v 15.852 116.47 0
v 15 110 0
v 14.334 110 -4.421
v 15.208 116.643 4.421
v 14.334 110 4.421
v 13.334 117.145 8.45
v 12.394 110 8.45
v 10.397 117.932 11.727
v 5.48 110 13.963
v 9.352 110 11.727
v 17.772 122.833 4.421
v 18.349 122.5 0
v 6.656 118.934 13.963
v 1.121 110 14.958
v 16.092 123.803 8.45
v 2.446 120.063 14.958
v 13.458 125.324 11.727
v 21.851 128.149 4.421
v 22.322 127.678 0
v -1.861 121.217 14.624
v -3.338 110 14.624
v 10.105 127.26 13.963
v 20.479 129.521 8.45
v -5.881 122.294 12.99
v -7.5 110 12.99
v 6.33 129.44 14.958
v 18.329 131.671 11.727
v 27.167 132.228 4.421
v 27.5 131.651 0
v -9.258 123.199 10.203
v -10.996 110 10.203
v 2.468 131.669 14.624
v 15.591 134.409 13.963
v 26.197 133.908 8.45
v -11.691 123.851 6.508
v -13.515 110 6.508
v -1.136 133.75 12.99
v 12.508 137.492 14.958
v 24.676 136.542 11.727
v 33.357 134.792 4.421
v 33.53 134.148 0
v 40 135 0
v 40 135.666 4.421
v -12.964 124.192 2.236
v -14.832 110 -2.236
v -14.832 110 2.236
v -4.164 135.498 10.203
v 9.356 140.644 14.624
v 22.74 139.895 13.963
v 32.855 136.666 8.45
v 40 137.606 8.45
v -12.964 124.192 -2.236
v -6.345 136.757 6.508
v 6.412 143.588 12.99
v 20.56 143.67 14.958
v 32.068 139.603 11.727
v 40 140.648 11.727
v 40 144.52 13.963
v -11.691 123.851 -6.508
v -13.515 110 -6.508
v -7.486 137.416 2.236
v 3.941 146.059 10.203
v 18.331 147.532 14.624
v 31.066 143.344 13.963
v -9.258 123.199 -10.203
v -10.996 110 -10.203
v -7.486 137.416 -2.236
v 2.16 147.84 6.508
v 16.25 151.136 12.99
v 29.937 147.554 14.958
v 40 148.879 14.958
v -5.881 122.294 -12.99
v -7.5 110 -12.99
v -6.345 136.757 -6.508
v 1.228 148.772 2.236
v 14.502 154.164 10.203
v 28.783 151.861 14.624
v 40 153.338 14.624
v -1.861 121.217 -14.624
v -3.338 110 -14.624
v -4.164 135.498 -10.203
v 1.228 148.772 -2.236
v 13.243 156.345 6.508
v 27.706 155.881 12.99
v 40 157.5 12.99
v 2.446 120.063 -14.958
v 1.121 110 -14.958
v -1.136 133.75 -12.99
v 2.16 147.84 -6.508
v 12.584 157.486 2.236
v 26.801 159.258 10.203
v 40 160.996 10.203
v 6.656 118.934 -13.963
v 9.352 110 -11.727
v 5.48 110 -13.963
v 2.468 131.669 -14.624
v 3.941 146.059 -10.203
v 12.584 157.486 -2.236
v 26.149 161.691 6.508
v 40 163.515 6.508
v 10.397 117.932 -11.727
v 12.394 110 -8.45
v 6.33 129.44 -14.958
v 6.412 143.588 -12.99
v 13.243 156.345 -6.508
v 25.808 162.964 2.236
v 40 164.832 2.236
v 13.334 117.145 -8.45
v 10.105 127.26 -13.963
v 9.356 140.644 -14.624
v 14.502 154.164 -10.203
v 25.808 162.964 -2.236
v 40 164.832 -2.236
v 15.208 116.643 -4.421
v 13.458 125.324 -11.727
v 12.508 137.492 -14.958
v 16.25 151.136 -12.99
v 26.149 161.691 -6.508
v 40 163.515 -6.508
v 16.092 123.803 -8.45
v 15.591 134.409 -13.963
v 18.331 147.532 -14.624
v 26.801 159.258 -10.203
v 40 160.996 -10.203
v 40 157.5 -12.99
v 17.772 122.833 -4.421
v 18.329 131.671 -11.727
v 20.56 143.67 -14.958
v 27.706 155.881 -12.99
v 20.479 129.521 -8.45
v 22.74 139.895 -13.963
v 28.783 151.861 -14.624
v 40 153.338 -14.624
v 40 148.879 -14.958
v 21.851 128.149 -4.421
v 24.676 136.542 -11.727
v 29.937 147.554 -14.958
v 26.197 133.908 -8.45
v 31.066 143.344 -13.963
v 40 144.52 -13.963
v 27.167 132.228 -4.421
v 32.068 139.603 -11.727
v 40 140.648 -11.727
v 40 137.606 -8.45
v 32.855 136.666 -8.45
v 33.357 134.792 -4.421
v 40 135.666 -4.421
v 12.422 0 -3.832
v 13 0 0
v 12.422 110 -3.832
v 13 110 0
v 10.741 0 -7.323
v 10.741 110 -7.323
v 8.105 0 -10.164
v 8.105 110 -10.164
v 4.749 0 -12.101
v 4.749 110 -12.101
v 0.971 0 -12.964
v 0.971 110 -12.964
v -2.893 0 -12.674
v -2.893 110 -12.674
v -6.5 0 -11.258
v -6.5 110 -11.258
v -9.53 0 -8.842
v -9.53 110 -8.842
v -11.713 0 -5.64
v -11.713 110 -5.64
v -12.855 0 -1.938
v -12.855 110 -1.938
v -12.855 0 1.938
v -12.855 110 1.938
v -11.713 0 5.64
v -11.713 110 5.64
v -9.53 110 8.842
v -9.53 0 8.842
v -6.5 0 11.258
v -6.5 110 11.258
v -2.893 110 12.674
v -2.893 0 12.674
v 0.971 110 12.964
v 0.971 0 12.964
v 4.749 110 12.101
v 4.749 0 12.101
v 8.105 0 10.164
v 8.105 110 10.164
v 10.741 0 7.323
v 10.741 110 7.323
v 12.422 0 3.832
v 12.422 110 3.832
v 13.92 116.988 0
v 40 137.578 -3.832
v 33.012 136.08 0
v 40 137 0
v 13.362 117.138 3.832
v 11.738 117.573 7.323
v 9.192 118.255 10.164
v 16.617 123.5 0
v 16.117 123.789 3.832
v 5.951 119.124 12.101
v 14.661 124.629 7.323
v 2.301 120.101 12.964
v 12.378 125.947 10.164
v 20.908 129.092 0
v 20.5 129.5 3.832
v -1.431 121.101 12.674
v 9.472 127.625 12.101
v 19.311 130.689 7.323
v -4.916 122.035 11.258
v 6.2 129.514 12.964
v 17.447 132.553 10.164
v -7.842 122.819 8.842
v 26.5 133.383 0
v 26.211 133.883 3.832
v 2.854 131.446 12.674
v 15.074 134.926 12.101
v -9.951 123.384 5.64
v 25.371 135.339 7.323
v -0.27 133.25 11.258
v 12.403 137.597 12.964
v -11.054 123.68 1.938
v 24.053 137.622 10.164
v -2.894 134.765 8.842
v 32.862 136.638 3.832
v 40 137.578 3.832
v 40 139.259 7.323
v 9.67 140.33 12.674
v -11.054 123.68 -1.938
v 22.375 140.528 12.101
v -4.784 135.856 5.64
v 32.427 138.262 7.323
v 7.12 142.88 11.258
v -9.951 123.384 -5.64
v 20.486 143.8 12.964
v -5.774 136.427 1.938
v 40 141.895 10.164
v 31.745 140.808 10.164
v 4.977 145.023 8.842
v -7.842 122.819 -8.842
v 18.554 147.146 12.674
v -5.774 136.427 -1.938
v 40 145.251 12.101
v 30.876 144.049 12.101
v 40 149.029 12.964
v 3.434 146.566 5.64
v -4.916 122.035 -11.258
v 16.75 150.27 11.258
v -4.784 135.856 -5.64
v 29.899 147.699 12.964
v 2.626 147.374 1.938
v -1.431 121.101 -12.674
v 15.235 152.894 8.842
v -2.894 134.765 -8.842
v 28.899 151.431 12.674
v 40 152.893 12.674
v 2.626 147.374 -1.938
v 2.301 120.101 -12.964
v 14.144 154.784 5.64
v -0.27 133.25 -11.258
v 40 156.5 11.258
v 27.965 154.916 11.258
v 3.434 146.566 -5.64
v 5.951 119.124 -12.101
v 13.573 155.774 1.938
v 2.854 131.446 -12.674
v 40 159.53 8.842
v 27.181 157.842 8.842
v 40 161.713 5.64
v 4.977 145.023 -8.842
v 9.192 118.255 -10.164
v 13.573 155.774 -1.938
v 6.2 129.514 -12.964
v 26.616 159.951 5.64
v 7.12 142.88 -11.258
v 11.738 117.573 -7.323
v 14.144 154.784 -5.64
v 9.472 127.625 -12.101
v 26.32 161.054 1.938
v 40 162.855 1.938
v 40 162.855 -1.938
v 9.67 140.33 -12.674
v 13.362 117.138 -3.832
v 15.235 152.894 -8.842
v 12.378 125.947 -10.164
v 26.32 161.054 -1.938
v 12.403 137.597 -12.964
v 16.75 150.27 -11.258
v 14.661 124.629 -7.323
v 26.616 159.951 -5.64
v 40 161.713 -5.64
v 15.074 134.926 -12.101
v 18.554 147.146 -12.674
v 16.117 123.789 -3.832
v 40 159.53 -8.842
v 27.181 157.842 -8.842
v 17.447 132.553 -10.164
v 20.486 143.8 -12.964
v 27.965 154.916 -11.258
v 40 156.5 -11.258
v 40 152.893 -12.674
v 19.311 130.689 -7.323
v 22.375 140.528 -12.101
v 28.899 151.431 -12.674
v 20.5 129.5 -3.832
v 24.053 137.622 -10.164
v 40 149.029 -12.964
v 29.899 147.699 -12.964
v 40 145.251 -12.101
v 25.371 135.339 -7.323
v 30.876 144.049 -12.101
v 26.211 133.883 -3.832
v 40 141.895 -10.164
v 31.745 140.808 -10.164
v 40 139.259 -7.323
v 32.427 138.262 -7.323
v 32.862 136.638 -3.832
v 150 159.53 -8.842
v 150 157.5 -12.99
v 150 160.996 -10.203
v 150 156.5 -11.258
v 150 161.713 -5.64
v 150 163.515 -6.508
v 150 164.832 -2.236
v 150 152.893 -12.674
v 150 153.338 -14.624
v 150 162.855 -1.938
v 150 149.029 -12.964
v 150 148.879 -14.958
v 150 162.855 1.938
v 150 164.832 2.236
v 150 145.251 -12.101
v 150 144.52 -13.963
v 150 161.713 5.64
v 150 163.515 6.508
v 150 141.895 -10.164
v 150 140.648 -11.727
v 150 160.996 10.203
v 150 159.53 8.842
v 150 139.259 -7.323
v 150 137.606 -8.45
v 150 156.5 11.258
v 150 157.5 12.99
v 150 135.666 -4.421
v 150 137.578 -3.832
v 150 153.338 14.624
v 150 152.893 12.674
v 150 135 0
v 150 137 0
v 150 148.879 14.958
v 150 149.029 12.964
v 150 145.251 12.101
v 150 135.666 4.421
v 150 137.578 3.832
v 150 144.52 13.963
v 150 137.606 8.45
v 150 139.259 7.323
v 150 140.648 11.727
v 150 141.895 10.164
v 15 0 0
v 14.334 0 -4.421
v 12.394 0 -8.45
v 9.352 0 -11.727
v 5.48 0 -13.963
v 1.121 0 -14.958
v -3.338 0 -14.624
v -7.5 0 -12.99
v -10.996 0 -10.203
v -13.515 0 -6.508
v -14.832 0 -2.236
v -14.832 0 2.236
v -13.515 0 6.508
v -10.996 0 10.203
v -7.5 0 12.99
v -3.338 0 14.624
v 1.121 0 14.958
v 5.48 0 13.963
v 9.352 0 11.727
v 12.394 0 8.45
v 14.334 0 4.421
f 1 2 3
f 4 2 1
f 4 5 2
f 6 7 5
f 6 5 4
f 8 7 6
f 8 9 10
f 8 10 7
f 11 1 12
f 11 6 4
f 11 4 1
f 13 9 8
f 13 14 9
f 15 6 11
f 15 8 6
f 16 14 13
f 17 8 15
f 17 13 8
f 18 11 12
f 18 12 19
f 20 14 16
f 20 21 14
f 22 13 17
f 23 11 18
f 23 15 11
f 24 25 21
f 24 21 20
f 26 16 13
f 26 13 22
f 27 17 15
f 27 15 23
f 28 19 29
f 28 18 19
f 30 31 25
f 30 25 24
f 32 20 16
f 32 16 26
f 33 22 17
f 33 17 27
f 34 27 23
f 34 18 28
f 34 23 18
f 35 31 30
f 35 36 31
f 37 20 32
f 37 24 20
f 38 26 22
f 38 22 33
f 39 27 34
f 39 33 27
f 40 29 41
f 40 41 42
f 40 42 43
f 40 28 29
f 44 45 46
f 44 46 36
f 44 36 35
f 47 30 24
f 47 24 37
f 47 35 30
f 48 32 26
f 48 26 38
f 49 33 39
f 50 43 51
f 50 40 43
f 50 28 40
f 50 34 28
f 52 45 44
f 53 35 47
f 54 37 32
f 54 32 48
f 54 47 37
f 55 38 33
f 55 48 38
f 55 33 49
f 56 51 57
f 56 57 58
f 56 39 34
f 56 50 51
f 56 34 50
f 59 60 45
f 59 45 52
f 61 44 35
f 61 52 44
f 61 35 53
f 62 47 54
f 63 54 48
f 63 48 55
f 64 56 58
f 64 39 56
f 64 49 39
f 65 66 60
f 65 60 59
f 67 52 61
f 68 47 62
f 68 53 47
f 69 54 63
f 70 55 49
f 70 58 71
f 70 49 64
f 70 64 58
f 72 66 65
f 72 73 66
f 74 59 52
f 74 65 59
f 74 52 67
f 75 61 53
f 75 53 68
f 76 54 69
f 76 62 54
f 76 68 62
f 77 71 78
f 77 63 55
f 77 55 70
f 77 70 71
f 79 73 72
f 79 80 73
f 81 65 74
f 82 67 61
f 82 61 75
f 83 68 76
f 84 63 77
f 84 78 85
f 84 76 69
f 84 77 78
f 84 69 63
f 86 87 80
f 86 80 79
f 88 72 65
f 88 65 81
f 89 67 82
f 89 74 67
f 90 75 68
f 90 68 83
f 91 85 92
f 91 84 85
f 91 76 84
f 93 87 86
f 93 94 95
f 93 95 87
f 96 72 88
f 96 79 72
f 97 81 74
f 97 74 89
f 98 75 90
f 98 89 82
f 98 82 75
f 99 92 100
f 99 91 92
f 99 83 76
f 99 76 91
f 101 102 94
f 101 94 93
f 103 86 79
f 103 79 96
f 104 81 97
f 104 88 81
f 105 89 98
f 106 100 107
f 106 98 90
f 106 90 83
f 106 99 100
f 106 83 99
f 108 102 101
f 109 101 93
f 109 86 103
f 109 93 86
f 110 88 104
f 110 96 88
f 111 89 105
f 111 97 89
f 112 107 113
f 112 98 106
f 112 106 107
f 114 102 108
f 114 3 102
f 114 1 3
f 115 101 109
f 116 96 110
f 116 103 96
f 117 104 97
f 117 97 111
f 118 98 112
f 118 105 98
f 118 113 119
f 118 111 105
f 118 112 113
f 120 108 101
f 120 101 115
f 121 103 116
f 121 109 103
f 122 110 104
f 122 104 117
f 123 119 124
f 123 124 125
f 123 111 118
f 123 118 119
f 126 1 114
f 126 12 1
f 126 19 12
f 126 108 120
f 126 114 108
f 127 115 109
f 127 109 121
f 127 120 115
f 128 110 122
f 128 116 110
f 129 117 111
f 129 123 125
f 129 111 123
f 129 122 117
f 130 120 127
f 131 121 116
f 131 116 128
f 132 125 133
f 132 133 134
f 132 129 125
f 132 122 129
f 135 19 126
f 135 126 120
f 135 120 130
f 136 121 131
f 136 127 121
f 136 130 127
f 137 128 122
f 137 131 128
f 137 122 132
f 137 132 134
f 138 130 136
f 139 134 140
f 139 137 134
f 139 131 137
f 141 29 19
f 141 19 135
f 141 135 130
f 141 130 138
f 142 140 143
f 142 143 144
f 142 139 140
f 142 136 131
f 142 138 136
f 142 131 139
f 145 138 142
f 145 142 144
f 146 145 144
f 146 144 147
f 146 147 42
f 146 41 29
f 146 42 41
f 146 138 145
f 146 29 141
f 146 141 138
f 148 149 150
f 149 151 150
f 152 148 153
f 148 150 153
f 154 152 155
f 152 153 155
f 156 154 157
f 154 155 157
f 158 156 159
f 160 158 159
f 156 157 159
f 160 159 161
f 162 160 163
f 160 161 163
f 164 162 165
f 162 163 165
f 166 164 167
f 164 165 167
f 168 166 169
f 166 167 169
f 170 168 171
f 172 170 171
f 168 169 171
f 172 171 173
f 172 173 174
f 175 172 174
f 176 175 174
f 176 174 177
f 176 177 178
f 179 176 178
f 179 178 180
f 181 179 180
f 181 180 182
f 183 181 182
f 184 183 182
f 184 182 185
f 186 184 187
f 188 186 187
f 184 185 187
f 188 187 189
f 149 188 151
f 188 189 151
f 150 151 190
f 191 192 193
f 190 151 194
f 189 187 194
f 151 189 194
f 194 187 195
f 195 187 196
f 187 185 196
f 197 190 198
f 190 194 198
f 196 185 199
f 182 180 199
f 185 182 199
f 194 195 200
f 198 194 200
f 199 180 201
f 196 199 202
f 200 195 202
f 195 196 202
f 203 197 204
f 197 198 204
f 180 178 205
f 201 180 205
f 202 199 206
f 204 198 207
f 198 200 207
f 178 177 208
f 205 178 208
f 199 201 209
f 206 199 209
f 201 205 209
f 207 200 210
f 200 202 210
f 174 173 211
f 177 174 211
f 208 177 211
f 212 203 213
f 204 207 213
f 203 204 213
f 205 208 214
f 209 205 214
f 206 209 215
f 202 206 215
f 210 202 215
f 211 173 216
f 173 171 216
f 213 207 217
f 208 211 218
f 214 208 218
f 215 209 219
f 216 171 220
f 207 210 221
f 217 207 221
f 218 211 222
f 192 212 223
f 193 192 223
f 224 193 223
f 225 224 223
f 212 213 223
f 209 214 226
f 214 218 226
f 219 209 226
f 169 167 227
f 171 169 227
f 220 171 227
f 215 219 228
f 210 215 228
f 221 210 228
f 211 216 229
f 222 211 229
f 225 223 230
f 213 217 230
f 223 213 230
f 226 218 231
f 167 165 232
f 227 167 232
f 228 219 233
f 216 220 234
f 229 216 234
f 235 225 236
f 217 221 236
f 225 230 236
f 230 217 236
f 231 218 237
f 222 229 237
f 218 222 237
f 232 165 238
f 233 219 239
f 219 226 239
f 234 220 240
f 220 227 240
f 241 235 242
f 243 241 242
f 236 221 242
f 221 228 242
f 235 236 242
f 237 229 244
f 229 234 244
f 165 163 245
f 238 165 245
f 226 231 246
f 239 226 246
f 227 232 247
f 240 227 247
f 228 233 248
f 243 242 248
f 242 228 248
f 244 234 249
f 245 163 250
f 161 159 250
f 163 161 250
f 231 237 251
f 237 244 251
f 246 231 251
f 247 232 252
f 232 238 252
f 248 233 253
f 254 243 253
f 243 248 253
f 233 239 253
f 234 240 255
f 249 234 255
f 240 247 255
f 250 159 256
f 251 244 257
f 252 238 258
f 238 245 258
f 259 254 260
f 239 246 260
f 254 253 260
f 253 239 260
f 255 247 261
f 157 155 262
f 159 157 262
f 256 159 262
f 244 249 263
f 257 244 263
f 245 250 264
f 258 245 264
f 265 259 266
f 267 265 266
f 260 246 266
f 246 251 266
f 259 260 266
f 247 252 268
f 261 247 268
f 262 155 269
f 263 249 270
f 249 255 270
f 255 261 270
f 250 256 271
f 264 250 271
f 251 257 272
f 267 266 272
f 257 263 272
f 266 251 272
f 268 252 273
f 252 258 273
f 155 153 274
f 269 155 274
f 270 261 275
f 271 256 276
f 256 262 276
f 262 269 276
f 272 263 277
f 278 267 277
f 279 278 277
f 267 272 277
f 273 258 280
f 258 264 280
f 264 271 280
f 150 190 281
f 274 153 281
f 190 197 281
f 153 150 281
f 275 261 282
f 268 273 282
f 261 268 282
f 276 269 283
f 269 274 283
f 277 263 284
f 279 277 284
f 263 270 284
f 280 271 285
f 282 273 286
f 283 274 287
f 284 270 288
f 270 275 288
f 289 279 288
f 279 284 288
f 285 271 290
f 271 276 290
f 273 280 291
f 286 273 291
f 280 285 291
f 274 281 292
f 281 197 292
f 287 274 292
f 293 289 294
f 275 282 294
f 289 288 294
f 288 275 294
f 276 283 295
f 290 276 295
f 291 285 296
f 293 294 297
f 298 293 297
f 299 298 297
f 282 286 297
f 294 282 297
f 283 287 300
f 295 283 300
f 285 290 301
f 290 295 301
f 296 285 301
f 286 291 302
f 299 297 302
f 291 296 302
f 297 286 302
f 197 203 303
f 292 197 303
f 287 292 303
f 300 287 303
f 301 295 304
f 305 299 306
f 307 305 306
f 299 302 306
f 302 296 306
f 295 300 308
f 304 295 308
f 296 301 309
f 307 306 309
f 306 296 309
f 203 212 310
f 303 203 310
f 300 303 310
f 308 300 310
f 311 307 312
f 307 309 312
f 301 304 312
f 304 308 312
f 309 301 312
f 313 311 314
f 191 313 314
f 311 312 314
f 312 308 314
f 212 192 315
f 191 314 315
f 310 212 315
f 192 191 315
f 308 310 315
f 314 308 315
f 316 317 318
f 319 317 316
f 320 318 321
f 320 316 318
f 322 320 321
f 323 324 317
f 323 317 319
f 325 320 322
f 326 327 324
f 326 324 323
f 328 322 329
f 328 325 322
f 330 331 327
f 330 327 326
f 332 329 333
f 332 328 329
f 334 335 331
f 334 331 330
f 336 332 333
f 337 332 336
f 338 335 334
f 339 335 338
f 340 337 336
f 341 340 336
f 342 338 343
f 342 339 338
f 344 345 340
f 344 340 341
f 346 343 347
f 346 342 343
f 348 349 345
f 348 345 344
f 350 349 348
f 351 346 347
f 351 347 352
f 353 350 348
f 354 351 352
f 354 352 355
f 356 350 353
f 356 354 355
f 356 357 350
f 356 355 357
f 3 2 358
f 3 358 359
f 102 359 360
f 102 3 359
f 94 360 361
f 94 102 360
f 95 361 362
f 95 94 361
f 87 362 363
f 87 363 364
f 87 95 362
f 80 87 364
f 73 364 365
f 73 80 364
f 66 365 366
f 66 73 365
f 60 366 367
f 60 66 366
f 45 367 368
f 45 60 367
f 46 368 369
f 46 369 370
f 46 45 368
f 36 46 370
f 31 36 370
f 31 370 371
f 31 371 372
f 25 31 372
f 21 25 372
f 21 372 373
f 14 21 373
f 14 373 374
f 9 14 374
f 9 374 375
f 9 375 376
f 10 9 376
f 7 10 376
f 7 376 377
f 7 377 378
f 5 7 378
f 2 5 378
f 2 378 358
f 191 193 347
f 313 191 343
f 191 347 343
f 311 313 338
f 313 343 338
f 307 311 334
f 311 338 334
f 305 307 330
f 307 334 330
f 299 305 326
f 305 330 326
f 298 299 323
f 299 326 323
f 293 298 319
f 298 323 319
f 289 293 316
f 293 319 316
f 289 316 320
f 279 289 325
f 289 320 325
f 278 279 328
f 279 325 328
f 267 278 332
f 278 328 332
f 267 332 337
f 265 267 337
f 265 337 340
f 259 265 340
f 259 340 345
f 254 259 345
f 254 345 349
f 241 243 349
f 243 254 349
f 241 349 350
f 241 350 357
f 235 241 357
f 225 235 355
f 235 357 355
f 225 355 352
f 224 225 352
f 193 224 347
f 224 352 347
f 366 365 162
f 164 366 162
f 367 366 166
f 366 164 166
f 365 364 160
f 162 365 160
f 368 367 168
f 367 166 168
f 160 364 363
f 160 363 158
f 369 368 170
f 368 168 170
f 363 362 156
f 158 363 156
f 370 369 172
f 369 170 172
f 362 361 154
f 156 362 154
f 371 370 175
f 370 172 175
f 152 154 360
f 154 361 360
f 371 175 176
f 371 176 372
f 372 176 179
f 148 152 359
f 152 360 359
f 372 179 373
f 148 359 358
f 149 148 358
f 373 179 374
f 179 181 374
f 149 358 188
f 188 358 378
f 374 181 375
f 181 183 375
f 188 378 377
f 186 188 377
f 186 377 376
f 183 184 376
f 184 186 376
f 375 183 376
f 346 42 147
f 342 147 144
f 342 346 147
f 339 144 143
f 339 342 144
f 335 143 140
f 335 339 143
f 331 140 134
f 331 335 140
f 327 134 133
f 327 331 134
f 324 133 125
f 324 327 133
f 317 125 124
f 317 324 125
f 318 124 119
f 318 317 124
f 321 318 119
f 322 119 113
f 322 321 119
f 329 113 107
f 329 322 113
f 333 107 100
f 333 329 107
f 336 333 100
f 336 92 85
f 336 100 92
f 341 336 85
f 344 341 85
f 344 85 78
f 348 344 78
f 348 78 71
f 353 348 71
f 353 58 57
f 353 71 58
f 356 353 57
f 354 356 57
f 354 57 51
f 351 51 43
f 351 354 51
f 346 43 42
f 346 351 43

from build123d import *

# Parameters (mm, degrees)
ESBO_O2_R = 15
CASCA1_T  = -2


with BuildPart() as part:
    # Varredura1: sweep along a path in Esboço1
    with BuildLine(Plane.XY) as varredura1_path:
        Line((0, 0), (0, 110))
        ThreePointArc((0, 110), (11.715728753, 138.284271247), (40, 150))
        Line((40, 150), (150, 150))
    # Esboço2 → Varredura1 (sweep)
    with BuildSketch(Plane(origin=(0, 0, 0), x_dir=(1, 0, 0), z_dir=(0, 1, 0))):
        Circle(ESBO_O2_R)
    sweep(path=varredura1_path.line)

    # Casca1
    casca1_openings = [part.faces().sort_by_distance(p)[0] for p in [
        (150, 150, 0),
        (0, 0, 0),
    ]]
    offset(amount=CASCA1_T, openings=casca1_openings, kind=Kind.INTERSECTION)


solid = part.part
